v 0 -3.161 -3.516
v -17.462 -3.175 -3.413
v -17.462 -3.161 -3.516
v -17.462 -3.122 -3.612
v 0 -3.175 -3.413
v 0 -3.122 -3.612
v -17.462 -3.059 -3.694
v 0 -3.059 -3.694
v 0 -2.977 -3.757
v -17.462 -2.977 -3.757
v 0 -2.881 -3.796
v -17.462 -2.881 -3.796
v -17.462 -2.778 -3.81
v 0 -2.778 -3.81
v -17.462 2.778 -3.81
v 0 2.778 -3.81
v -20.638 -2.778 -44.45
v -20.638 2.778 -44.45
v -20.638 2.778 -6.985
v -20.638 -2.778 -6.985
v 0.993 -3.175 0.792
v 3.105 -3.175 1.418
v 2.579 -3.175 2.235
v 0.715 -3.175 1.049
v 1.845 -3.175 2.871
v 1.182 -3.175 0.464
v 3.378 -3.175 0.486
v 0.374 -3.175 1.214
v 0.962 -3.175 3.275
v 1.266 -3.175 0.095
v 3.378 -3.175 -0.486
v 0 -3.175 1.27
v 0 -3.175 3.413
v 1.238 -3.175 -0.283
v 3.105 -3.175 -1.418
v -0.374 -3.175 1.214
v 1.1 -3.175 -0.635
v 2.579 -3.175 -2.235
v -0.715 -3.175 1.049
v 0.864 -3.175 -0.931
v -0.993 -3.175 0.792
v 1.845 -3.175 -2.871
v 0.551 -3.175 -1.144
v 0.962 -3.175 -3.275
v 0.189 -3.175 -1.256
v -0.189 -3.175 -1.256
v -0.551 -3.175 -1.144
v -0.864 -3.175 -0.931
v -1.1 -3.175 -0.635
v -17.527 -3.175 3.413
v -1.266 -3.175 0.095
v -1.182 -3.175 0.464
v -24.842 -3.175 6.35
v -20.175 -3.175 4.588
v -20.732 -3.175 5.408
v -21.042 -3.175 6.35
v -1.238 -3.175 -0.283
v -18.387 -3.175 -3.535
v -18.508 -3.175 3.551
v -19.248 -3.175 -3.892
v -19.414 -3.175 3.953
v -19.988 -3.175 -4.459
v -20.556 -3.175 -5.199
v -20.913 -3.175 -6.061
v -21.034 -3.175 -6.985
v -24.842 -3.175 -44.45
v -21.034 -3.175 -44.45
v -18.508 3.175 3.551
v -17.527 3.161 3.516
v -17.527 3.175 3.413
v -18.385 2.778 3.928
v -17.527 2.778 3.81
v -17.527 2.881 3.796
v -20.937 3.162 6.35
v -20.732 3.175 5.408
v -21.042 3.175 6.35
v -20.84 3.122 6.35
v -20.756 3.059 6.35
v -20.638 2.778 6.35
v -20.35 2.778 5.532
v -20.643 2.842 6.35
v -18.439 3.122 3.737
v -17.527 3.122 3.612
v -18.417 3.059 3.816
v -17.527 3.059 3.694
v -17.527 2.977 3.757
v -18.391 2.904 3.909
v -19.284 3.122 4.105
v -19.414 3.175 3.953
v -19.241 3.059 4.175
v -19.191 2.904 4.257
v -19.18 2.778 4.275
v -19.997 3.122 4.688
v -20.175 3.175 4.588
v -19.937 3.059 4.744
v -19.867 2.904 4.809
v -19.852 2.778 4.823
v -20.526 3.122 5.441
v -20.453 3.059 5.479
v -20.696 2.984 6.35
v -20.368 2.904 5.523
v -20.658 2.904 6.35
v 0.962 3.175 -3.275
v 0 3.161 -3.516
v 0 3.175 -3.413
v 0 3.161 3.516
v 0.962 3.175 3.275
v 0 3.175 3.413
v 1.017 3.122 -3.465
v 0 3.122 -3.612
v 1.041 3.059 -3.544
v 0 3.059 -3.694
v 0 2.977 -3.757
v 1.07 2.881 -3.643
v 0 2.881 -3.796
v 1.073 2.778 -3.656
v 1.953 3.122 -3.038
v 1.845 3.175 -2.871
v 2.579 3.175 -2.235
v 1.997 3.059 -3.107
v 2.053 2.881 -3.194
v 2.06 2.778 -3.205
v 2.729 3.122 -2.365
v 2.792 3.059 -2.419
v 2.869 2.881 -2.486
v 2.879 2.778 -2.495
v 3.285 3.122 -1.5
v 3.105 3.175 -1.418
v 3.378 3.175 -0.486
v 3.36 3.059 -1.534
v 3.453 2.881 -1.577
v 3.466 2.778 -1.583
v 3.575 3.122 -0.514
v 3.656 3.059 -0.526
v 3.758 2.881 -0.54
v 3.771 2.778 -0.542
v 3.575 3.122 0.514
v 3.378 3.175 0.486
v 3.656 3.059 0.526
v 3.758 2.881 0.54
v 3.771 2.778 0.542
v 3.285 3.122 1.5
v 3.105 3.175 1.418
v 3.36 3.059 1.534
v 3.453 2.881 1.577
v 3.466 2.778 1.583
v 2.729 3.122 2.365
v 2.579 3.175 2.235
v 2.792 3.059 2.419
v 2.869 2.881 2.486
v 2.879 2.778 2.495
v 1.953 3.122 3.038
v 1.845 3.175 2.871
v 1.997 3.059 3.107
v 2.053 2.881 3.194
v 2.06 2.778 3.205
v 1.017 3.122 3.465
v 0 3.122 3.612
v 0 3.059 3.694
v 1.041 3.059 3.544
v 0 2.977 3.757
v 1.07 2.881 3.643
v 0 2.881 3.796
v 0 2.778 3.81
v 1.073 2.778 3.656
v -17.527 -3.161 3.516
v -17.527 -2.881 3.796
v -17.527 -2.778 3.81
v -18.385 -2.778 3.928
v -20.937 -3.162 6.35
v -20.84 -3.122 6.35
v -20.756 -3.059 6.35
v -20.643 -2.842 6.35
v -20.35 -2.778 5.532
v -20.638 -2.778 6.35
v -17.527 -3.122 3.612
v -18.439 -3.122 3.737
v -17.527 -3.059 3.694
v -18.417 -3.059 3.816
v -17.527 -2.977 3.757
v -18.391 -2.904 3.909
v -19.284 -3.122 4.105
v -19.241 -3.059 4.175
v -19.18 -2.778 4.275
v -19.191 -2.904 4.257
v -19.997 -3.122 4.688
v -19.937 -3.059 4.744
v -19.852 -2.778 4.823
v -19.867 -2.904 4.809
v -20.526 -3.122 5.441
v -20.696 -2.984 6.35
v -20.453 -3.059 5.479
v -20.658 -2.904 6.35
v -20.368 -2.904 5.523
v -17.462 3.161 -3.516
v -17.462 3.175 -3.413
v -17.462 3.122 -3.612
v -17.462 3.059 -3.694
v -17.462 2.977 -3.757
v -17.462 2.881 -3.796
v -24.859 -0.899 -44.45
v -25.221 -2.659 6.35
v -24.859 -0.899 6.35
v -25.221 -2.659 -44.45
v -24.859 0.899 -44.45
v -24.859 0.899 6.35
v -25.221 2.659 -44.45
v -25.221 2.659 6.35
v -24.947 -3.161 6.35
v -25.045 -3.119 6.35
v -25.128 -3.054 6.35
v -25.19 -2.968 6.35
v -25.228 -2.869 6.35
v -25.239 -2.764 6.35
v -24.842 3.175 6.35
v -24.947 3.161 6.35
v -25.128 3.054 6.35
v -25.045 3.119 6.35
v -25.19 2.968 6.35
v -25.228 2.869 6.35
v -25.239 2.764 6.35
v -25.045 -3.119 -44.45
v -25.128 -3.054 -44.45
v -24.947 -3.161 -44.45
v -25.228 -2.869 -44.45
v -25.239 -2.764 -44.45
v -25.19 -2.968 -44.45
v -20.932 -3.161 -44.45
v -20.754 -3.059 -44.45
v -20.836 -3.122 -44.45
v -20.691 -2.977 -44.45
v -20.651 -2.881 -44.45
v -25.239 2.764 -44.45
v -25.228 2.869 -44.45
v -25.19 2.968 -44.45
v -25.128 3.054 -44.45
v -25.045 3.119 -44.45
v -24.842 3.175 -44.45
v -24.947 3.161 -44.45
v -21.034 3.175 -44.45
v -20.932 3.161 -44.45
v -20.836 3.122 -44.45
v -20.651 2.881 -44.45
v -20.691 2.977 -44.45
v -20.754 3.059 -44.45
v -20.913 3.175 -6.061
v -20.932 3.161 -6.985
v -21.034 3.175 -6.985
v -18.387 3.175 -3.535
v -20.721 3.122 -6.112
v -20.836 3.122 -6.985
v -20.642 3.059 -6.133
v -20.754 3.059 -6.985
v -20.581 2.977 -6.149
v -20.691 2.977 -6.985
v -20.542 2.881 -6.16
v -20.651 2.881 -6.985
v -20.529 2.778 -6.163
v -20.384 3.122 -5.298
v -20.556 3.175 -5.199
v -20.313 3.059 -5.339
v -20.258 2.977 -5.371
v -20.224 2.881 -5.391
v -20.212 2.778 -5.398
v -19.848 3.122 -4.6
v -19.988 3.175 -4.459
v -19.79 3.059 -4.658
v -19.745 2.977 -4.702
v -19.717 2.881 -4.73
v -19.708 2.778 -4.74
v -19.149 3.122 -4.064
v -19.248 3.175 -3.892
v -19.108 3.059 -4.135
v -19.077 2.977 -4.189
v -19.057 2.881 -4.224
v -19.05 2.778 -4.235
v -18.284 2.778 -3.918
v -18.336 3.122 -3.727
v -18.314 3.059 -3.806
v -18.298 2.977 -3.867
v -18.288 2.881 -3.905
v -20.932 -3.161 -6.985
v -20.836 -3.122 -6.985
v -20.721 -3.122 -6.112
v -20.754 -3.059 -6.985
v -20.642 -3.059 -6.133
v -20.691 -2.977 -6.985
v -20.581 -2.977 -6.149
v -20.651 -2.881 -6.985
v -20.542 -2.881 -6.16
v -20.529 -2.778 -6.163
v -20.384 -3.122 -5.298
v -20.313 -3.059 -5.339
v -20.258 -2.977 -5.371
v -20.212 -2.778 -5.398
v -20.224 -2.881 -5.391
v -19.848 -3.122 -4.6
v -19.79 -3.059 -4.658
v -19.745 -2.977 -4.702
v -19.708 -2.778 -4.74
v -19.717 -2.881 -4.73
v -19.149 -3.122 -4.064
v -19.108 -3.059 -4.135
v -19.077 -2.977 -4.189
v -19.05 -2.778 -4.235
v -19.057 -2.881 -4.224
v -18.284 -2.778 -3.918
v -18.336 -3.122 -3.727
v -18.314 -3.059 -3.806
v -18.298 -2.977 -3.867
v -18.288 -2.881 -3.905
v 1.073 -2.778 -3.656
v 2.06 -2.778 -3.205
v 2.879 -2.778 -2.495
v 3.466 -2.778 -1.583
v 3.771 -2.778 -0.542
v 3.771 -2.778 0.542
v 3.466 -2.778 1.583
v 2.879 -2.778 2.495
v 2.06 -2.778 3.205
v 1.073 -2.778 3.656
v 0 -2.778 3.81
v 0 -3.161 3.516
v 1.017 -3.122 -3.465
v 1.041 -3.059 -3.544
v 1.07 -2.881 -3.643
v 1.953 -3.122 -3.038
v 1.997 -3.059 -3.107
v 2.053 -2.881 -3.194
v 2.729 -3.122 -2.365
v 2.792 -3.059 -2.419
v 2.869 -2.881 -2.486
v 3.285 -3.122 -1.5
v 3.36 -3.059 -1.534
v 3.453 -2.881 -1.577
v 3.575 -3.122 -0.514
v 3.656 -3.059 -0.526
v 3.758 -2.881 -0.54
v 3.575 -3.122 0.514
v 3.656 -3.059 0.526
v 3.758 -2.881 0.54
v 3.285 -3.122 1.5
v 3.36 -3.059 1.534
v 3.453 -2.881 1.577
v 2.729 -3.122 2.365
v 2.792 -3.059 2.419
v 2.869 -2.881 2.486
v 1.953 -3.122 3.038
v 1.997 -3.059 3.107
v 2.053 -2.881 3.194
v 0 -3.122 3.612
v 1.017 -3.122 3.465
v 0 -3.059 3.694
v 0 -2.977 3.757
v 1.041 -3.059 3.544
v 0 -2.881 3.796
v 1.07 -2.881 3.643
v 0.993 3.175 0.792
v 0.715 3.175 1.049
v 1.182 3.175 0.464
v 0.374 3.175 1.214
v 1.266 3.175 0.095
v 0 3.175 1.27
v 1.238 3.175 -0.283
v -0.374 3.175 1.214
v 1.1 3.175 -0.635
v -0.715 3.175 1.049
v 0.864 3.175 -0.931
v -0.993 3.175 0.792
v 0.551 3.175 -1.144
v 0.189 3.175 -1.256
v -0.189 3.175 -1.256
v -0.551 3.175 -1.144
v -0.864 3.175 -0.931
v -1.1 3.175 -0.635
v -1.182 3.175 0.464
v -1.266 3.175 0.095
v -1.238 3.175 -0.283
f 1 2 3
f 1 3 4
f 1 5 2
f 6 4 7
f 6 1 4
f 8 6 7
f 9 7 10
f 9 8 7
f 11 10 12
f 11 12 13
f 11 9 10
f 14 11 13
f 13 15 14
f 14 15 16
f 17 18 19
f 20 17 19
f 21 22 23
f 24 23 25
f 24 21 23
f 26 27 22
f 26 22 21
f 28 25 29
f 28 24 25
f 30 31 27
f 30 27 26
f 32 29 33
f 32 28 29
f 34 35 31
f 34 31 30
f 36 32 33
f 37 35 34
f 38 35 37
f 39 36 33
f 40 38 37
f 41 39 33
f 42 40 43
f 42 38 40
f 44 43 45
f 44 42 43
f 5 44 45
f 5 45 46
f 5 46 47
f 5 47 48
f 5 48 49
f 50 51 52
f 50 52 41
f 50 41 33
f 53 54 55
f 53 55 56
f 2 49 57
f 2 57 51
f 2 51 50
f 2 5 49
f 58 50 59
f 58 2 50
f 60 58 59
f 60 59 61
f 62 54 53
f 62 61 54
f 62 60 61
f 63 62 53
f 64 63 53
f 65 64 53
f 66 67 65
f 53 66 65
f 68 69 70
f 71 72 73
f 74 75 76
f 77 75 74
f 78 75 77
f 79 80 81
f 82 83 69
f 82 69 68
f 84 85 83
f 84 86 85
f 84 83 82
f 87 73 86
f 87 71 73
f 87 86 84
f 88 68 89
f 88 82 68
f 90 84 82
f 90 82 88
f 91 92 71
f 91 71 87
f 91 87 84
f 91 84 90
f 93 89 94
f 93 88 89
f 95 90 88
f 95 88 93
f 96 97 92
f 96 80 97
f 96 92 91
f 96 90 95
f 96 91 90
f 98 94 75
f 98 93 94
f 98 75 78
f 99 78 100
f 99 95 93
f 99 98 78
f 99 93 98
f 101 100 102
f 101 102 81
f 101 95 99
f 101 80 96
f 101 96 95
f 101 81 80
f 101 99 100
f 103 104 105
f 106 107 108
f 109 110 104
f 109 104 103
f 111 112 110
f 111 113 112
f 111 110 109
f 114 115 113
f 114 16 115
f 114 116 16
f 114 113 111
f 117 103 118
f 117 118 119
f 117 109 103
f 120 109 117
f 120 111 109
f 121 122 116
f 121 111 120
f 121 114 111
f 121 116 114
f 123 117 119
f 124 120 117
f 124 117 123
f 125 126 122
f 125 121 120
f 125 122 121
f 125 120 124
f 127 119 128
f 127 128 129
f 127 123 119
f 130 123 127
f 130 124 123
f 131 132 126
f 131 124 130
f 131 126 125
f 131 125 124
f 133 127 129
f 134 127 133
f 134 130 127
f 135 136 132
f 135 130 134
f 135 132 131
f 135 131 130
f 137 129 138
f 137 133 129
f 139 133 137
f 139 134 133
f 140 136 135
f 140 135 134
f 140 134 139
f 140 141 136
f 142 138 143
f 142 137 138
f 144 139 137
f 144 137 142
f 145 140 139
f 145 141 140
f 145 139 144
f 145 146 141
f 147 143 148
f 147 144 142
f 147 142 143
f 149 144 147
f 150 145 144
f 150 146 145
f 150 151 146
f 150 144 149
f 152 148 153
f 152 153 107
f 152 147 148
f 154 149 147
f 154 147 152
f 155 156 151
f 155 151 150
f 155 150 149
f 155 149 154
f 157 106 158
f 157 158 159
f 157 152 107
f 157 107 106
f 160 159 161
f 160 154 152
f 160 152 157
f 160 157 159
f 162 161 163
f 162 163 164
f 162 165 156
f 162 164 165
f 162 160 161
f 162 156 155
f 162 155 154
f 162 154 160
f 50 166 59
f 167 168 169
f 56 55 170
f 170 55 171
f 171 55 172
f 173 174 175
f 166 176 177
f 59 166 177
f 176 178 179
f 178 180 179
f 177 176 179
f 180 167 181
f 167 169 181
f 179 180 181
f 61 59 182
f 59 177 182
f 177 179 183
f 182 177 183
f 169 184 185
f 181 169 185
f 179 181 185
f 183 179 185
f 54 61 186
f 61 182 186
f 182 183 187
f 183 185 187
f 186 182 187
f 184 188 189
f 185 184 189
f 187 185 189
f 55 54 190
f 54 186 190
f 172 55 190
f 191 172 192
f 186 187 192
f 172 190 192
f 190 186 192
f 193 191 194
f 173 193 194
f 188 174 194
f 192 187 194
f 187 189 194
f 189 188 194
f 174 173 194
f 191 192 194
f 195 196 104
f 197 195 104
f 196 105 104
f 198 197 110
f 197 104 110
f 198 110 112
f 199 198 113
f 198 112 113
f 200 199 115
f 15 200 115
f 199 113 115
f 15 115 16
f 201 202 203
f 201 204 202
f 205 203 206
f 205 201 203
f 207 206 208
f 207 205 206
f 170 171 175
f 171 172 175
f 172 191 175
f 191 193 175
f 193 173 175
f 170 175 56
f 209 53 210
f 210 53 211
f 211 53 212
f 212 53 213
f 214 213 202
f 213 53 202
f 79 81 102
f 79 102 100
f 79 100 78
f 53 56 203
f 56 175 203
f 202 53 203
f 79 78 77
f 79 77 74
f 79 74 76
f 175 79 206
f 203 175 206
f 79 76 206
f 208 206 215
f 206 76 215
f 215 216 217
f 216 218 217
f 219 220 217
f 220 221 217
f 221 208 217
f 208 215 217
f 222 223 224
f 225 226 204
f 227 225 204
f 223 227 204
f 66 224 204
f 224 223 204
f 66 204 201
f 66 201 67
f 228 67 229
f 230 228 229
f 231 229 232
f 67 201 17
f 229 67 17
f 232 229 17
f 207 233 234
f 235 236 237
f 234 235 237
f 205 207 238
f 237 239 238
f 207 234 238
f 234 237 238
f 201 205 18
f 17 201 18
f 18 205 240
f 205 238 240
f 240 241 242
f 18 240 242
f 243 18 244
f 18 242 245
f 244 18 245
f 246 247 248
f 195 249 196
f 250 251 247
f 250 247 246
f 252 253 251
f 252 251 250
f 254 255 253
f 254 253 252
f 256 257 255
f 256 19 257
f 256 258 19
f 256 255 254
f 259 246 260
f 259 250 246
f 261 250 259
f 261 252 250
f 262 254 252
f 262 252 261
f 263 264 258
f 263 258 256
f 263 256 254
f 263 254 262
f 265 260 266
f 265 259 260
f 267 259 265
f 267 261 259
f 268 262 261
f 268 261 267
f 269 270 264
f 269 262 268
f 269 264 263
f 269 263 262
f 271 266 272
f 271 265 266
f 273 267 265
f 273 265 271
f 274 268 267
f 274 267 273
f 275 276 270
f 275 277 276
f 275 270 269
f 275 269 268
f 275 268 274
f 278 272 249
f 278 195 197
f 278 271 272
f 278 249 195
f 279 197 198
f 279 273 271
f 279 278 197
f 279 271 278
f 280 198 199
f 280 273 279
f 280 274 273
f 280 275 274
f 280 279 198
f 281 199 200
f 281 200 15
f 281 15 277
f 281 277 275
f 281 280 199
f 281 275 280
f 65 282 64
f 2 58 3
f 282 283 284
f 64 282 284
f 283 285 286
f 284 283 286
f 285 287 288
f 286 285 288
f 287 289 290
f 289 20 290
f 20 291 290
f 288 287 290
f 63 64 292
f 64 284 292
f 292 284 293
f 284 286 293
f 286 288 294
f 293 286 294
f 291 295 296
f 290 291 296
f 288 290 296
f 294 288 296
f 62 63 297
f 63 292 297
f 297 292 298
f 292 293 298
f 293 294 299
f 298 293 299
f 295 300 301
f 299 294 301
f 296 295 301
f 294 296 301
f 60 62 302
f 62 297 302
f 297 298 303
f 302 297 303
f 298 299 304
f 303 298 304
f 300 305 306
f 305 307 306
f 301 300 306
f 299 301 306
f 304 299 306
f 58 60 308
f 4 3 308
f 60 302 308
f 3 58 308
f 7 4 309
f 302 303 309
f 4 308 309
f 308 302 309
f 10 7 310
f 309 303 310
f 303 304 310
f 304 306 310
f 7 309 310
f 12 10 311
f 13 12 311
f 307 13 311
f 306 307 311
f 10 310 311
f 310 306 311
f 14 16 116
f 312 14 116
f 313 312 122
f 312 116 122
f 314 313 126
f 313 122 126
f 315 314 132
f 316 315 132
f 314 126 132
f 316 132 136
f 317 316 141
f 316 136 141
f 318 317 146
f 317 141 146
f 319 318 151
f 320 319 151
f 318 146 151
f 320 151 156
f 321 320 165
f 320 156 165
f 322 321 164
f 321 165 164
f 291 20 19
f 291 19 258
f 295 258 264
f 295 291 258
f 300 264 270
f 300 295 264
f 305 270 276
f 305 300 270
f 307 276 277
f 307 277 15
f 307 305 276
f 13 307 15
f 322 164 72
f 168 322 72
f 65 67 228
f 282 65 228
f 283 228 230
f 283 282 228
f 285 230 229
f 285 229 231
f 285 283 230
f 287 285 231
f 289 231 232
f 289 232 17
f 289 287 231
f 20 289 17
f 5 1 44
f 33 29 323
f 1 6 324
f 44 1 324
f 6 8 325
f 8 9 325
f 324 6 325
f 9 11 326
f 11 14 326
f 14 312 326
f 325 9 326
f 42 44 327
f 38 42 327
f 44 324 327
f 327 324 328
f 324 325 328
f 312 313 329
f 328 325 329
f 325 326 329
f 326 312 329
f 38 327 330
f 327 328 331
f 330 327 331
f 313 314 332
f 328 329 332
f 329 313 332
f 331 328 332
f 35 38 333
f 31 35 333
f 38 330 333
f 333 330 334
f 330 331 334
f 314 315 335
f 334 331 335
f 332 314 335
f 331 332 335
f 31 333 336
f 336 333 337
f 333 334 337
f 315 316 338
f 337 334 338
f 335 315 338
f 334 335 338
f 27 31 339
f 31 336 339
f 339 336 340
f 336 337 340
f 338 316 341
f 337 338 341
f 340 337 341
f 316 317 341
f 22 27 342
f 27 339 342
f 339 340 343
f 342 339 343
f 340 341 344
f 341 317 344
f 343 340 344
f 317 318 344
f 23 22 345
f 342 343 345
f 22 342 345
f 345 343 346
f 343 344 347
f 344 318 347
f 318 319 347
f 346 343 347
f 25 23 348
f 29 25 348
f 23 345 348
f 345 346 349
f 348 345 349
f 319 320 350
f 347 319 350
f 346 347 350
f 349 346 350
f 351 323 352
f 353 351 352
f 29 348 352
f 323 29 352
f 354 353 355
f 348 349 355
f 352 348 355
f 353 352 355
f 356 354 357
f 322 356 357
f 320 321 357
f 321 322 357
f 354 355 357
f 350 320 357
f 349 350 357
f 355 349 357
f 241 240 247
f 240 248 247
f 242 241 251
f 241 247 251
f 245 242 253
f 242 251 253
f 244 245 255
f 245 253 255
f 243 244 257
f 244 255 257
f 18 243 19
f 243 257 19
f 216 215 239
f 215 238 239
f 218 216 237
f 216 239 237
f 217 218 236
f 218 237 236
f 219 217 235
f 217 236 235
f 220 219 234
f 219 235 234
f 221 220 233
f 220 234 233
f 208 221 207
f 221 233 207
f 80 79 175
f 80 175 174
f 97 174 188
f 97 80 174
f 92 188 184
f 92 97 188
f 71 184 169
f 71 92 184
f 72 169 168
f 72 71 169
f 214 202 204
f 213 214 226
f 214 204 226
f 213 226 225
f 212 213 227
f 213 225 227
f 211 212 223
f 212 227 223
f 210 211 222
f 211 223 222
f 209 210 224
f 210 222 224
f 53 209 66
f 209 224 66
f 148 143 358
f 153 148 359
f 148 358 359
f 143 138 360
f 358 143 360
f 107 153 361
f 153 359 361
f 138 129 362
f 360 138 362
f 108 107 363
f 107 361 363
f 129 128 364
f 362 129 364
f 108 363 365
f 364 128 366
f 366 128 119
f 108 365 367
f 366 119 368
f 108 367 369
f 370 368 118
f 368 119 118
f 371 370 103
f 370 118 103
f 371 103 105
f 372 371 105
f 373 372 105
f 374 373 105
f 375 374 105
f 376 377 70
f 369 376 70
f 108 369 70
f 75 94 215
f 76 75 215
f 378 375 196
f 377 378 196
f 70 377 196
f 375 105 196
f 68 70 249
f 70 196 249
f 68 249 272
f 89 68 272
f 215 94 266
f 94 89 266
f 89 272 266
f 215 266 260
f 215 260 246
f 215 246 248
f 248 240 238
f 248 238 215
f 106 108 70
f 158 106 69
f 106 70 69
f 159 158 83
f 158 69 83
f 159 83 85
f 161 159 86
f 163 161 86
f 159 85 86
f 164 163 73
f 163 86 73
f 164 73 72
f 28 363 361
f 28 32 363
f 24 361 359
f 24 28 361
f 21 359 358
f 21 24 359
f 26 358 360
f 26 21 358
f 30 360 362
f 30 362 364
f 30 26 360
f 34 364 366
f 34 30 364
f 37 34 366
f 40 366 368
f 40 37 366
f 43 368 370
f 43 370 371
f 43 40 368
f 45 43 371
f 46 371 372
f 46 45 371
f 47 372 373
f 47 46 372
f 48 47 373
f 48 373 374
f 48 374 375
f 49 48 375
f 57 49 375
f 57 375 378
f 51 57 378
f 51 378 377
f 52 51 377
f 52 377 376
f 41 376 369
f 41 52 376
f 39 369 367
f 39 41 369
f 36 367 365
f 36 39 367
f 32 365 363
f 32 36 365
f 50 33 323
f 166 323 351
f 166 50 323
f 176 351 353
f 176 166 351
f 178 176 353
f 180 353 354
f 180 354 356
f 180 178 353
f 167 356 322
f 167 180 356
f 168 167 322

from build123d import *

# Parameters (mm, degrees)
SKETCH1_R               = 1.27
BOSS_EXTRUDE1_DEPTH     = 3.175
FILLET1_R               = 3.175
CUT_EXTRUDE1_DEPTH      = 57.884801353
CUT_EXTRUDE1_DEPTH_BACK = 57.884801353
SKETCH3_R               = 8.89
FILLET2_R               = 0.396875


with BuildPart() as part:
    # Sketch1 → Boss-Extrude1 (new, symmetric)
    with BuildSketch(Plane(origin=(0, 0, 0), x_dir=(1, 0, 0), z_dir=(0, 1, 0))):
        with BuildLine():
            Line((-20.6375, -3.81), (-20.6375, -6.35))
            Line((-20.6375, -6.35), (-25.4, -6.35))
            Line((-25.4, -6.35), (-25.4, 44.45))
            Line((-25.4, 44.45), (-20.6375, 44.45))
            Line((-20.6375, 44.45), (-20.6375, 3.81))
            Line((-20.6375, 3.81), (0, 3.81))
            ThreePointArc((0, 3.81), (3.81, 0), (0, -3.81))
            Line((0, -3.81), (-20.6375, -3.81))
        make_face()
        with Locations(Location((0, 0, 0), (0, 0, 270))):
            Circle(SKETCH1_R, mode=Mode.SUBTRACT)
    extrude(amount=BOSS_EXTRUDE1_DEPTH, both=True)

    # Fillet1
    # the kernel refuses this fillet: 3.175 mm, written as the material it adds along each edge
    with BuildSketch(Plane(origin=(-20.6375, 3.175, 3.81), x_dir=(1, 0, 0), z_dir=(0, -1, 0))) as fillet1_piece_1:
        with BuildLine():
            CenterArc((3.110851973, 3.175), FILLET1_R, 191.536959033, 78.463040967)
            Line((0, 2.54), (-0.062217039, 2.5273))
            ThreePointArc((-0.062217039, 2.5273), (-0.0635, 1.27), (-0.0635, 0))
            Line((-0.0635, 0), (0, -0.0635))
            Line((0, -0.0635), (3.110851973, -0.0635))
            Line((3.110851973, -0.0635), (3.110851973, 0))
        make_face()
    extrude(amount=6.35)
    with BuildSketch(Plane(origin=(-20.6375, -3.175, -3.81), x_dir=(1, 0, 0), z_dir=(0, 1, 0))) as fillet1_piece_2:
        with BuildLine():
            CenterArc((FILLET1_R, FILLET1_R), FILLET1_R, 180, 90)
            Line((0, FILLET1_R), (-FILLET1_R * 0.02, FILLET1_R))
            Line((-FILLET1_R * 0.02, FILLET1_R), (-FILLET1_R * 0.02, -FILLET1_R * 0.02))
            Line((-FILLET1_R * 0.02, -FILLET1_R * 0.02), (FILLET1_R, -FILLET1_R * 0.02))
            Line((FILLET1_R, -FILLET1_R * 0.02), (FILLET1_R, 0))
        make_face()
    extrude(amount=6.35)

    # Sketch3 → Cut-Extrude1 (cut, two sides: drawn at the far end of the back side and taken through both)
    with BuildSketch(Plane.XY.offset(6.35).offset(-CUT_EXTRUDE1_DEPTH_BACK)):
        with Locations((-33.703702487, 0)):
            Circle(SKETCH3_R)
    extrude(amount=CUT_EXTRUDE1_DEPTH + CUT_EXTRUDE1_DEPTH_BACK, mode=Mode.SUBTRACT)

    # Fillet2
    fillet2_edges = [part.edges().sort_by_distance(p)[0] for p in [
        (-8.73125, -3.175, -3.81),
        (3.81, -3.175, 0),
        (-25.4, 3.175, -19.05),
        (-8.763324013, -3.175, 3.81),
        (-8.763324013, 3.175, 3.81),
        (-20.6375, -3.175, -25.7175),
        (-20.6375, 3.175, -25.7175),
        (-19.534694341, -3.175, 4.525655575),
        (-19.534694341, 3.175, 4.525655575),
        (-19.70756403, -3.175, -4.73993597),
        (-19.70756403, 3.175, -4.73993597),
        (3.81, 3.175, 0),
        (-8.73125, 3.175, -3.81),
        (-25.4, -3.175, -19.05),
    ]]
    fillet(fillet2_edges, radius=FILLET2_R)


solid = part.part
